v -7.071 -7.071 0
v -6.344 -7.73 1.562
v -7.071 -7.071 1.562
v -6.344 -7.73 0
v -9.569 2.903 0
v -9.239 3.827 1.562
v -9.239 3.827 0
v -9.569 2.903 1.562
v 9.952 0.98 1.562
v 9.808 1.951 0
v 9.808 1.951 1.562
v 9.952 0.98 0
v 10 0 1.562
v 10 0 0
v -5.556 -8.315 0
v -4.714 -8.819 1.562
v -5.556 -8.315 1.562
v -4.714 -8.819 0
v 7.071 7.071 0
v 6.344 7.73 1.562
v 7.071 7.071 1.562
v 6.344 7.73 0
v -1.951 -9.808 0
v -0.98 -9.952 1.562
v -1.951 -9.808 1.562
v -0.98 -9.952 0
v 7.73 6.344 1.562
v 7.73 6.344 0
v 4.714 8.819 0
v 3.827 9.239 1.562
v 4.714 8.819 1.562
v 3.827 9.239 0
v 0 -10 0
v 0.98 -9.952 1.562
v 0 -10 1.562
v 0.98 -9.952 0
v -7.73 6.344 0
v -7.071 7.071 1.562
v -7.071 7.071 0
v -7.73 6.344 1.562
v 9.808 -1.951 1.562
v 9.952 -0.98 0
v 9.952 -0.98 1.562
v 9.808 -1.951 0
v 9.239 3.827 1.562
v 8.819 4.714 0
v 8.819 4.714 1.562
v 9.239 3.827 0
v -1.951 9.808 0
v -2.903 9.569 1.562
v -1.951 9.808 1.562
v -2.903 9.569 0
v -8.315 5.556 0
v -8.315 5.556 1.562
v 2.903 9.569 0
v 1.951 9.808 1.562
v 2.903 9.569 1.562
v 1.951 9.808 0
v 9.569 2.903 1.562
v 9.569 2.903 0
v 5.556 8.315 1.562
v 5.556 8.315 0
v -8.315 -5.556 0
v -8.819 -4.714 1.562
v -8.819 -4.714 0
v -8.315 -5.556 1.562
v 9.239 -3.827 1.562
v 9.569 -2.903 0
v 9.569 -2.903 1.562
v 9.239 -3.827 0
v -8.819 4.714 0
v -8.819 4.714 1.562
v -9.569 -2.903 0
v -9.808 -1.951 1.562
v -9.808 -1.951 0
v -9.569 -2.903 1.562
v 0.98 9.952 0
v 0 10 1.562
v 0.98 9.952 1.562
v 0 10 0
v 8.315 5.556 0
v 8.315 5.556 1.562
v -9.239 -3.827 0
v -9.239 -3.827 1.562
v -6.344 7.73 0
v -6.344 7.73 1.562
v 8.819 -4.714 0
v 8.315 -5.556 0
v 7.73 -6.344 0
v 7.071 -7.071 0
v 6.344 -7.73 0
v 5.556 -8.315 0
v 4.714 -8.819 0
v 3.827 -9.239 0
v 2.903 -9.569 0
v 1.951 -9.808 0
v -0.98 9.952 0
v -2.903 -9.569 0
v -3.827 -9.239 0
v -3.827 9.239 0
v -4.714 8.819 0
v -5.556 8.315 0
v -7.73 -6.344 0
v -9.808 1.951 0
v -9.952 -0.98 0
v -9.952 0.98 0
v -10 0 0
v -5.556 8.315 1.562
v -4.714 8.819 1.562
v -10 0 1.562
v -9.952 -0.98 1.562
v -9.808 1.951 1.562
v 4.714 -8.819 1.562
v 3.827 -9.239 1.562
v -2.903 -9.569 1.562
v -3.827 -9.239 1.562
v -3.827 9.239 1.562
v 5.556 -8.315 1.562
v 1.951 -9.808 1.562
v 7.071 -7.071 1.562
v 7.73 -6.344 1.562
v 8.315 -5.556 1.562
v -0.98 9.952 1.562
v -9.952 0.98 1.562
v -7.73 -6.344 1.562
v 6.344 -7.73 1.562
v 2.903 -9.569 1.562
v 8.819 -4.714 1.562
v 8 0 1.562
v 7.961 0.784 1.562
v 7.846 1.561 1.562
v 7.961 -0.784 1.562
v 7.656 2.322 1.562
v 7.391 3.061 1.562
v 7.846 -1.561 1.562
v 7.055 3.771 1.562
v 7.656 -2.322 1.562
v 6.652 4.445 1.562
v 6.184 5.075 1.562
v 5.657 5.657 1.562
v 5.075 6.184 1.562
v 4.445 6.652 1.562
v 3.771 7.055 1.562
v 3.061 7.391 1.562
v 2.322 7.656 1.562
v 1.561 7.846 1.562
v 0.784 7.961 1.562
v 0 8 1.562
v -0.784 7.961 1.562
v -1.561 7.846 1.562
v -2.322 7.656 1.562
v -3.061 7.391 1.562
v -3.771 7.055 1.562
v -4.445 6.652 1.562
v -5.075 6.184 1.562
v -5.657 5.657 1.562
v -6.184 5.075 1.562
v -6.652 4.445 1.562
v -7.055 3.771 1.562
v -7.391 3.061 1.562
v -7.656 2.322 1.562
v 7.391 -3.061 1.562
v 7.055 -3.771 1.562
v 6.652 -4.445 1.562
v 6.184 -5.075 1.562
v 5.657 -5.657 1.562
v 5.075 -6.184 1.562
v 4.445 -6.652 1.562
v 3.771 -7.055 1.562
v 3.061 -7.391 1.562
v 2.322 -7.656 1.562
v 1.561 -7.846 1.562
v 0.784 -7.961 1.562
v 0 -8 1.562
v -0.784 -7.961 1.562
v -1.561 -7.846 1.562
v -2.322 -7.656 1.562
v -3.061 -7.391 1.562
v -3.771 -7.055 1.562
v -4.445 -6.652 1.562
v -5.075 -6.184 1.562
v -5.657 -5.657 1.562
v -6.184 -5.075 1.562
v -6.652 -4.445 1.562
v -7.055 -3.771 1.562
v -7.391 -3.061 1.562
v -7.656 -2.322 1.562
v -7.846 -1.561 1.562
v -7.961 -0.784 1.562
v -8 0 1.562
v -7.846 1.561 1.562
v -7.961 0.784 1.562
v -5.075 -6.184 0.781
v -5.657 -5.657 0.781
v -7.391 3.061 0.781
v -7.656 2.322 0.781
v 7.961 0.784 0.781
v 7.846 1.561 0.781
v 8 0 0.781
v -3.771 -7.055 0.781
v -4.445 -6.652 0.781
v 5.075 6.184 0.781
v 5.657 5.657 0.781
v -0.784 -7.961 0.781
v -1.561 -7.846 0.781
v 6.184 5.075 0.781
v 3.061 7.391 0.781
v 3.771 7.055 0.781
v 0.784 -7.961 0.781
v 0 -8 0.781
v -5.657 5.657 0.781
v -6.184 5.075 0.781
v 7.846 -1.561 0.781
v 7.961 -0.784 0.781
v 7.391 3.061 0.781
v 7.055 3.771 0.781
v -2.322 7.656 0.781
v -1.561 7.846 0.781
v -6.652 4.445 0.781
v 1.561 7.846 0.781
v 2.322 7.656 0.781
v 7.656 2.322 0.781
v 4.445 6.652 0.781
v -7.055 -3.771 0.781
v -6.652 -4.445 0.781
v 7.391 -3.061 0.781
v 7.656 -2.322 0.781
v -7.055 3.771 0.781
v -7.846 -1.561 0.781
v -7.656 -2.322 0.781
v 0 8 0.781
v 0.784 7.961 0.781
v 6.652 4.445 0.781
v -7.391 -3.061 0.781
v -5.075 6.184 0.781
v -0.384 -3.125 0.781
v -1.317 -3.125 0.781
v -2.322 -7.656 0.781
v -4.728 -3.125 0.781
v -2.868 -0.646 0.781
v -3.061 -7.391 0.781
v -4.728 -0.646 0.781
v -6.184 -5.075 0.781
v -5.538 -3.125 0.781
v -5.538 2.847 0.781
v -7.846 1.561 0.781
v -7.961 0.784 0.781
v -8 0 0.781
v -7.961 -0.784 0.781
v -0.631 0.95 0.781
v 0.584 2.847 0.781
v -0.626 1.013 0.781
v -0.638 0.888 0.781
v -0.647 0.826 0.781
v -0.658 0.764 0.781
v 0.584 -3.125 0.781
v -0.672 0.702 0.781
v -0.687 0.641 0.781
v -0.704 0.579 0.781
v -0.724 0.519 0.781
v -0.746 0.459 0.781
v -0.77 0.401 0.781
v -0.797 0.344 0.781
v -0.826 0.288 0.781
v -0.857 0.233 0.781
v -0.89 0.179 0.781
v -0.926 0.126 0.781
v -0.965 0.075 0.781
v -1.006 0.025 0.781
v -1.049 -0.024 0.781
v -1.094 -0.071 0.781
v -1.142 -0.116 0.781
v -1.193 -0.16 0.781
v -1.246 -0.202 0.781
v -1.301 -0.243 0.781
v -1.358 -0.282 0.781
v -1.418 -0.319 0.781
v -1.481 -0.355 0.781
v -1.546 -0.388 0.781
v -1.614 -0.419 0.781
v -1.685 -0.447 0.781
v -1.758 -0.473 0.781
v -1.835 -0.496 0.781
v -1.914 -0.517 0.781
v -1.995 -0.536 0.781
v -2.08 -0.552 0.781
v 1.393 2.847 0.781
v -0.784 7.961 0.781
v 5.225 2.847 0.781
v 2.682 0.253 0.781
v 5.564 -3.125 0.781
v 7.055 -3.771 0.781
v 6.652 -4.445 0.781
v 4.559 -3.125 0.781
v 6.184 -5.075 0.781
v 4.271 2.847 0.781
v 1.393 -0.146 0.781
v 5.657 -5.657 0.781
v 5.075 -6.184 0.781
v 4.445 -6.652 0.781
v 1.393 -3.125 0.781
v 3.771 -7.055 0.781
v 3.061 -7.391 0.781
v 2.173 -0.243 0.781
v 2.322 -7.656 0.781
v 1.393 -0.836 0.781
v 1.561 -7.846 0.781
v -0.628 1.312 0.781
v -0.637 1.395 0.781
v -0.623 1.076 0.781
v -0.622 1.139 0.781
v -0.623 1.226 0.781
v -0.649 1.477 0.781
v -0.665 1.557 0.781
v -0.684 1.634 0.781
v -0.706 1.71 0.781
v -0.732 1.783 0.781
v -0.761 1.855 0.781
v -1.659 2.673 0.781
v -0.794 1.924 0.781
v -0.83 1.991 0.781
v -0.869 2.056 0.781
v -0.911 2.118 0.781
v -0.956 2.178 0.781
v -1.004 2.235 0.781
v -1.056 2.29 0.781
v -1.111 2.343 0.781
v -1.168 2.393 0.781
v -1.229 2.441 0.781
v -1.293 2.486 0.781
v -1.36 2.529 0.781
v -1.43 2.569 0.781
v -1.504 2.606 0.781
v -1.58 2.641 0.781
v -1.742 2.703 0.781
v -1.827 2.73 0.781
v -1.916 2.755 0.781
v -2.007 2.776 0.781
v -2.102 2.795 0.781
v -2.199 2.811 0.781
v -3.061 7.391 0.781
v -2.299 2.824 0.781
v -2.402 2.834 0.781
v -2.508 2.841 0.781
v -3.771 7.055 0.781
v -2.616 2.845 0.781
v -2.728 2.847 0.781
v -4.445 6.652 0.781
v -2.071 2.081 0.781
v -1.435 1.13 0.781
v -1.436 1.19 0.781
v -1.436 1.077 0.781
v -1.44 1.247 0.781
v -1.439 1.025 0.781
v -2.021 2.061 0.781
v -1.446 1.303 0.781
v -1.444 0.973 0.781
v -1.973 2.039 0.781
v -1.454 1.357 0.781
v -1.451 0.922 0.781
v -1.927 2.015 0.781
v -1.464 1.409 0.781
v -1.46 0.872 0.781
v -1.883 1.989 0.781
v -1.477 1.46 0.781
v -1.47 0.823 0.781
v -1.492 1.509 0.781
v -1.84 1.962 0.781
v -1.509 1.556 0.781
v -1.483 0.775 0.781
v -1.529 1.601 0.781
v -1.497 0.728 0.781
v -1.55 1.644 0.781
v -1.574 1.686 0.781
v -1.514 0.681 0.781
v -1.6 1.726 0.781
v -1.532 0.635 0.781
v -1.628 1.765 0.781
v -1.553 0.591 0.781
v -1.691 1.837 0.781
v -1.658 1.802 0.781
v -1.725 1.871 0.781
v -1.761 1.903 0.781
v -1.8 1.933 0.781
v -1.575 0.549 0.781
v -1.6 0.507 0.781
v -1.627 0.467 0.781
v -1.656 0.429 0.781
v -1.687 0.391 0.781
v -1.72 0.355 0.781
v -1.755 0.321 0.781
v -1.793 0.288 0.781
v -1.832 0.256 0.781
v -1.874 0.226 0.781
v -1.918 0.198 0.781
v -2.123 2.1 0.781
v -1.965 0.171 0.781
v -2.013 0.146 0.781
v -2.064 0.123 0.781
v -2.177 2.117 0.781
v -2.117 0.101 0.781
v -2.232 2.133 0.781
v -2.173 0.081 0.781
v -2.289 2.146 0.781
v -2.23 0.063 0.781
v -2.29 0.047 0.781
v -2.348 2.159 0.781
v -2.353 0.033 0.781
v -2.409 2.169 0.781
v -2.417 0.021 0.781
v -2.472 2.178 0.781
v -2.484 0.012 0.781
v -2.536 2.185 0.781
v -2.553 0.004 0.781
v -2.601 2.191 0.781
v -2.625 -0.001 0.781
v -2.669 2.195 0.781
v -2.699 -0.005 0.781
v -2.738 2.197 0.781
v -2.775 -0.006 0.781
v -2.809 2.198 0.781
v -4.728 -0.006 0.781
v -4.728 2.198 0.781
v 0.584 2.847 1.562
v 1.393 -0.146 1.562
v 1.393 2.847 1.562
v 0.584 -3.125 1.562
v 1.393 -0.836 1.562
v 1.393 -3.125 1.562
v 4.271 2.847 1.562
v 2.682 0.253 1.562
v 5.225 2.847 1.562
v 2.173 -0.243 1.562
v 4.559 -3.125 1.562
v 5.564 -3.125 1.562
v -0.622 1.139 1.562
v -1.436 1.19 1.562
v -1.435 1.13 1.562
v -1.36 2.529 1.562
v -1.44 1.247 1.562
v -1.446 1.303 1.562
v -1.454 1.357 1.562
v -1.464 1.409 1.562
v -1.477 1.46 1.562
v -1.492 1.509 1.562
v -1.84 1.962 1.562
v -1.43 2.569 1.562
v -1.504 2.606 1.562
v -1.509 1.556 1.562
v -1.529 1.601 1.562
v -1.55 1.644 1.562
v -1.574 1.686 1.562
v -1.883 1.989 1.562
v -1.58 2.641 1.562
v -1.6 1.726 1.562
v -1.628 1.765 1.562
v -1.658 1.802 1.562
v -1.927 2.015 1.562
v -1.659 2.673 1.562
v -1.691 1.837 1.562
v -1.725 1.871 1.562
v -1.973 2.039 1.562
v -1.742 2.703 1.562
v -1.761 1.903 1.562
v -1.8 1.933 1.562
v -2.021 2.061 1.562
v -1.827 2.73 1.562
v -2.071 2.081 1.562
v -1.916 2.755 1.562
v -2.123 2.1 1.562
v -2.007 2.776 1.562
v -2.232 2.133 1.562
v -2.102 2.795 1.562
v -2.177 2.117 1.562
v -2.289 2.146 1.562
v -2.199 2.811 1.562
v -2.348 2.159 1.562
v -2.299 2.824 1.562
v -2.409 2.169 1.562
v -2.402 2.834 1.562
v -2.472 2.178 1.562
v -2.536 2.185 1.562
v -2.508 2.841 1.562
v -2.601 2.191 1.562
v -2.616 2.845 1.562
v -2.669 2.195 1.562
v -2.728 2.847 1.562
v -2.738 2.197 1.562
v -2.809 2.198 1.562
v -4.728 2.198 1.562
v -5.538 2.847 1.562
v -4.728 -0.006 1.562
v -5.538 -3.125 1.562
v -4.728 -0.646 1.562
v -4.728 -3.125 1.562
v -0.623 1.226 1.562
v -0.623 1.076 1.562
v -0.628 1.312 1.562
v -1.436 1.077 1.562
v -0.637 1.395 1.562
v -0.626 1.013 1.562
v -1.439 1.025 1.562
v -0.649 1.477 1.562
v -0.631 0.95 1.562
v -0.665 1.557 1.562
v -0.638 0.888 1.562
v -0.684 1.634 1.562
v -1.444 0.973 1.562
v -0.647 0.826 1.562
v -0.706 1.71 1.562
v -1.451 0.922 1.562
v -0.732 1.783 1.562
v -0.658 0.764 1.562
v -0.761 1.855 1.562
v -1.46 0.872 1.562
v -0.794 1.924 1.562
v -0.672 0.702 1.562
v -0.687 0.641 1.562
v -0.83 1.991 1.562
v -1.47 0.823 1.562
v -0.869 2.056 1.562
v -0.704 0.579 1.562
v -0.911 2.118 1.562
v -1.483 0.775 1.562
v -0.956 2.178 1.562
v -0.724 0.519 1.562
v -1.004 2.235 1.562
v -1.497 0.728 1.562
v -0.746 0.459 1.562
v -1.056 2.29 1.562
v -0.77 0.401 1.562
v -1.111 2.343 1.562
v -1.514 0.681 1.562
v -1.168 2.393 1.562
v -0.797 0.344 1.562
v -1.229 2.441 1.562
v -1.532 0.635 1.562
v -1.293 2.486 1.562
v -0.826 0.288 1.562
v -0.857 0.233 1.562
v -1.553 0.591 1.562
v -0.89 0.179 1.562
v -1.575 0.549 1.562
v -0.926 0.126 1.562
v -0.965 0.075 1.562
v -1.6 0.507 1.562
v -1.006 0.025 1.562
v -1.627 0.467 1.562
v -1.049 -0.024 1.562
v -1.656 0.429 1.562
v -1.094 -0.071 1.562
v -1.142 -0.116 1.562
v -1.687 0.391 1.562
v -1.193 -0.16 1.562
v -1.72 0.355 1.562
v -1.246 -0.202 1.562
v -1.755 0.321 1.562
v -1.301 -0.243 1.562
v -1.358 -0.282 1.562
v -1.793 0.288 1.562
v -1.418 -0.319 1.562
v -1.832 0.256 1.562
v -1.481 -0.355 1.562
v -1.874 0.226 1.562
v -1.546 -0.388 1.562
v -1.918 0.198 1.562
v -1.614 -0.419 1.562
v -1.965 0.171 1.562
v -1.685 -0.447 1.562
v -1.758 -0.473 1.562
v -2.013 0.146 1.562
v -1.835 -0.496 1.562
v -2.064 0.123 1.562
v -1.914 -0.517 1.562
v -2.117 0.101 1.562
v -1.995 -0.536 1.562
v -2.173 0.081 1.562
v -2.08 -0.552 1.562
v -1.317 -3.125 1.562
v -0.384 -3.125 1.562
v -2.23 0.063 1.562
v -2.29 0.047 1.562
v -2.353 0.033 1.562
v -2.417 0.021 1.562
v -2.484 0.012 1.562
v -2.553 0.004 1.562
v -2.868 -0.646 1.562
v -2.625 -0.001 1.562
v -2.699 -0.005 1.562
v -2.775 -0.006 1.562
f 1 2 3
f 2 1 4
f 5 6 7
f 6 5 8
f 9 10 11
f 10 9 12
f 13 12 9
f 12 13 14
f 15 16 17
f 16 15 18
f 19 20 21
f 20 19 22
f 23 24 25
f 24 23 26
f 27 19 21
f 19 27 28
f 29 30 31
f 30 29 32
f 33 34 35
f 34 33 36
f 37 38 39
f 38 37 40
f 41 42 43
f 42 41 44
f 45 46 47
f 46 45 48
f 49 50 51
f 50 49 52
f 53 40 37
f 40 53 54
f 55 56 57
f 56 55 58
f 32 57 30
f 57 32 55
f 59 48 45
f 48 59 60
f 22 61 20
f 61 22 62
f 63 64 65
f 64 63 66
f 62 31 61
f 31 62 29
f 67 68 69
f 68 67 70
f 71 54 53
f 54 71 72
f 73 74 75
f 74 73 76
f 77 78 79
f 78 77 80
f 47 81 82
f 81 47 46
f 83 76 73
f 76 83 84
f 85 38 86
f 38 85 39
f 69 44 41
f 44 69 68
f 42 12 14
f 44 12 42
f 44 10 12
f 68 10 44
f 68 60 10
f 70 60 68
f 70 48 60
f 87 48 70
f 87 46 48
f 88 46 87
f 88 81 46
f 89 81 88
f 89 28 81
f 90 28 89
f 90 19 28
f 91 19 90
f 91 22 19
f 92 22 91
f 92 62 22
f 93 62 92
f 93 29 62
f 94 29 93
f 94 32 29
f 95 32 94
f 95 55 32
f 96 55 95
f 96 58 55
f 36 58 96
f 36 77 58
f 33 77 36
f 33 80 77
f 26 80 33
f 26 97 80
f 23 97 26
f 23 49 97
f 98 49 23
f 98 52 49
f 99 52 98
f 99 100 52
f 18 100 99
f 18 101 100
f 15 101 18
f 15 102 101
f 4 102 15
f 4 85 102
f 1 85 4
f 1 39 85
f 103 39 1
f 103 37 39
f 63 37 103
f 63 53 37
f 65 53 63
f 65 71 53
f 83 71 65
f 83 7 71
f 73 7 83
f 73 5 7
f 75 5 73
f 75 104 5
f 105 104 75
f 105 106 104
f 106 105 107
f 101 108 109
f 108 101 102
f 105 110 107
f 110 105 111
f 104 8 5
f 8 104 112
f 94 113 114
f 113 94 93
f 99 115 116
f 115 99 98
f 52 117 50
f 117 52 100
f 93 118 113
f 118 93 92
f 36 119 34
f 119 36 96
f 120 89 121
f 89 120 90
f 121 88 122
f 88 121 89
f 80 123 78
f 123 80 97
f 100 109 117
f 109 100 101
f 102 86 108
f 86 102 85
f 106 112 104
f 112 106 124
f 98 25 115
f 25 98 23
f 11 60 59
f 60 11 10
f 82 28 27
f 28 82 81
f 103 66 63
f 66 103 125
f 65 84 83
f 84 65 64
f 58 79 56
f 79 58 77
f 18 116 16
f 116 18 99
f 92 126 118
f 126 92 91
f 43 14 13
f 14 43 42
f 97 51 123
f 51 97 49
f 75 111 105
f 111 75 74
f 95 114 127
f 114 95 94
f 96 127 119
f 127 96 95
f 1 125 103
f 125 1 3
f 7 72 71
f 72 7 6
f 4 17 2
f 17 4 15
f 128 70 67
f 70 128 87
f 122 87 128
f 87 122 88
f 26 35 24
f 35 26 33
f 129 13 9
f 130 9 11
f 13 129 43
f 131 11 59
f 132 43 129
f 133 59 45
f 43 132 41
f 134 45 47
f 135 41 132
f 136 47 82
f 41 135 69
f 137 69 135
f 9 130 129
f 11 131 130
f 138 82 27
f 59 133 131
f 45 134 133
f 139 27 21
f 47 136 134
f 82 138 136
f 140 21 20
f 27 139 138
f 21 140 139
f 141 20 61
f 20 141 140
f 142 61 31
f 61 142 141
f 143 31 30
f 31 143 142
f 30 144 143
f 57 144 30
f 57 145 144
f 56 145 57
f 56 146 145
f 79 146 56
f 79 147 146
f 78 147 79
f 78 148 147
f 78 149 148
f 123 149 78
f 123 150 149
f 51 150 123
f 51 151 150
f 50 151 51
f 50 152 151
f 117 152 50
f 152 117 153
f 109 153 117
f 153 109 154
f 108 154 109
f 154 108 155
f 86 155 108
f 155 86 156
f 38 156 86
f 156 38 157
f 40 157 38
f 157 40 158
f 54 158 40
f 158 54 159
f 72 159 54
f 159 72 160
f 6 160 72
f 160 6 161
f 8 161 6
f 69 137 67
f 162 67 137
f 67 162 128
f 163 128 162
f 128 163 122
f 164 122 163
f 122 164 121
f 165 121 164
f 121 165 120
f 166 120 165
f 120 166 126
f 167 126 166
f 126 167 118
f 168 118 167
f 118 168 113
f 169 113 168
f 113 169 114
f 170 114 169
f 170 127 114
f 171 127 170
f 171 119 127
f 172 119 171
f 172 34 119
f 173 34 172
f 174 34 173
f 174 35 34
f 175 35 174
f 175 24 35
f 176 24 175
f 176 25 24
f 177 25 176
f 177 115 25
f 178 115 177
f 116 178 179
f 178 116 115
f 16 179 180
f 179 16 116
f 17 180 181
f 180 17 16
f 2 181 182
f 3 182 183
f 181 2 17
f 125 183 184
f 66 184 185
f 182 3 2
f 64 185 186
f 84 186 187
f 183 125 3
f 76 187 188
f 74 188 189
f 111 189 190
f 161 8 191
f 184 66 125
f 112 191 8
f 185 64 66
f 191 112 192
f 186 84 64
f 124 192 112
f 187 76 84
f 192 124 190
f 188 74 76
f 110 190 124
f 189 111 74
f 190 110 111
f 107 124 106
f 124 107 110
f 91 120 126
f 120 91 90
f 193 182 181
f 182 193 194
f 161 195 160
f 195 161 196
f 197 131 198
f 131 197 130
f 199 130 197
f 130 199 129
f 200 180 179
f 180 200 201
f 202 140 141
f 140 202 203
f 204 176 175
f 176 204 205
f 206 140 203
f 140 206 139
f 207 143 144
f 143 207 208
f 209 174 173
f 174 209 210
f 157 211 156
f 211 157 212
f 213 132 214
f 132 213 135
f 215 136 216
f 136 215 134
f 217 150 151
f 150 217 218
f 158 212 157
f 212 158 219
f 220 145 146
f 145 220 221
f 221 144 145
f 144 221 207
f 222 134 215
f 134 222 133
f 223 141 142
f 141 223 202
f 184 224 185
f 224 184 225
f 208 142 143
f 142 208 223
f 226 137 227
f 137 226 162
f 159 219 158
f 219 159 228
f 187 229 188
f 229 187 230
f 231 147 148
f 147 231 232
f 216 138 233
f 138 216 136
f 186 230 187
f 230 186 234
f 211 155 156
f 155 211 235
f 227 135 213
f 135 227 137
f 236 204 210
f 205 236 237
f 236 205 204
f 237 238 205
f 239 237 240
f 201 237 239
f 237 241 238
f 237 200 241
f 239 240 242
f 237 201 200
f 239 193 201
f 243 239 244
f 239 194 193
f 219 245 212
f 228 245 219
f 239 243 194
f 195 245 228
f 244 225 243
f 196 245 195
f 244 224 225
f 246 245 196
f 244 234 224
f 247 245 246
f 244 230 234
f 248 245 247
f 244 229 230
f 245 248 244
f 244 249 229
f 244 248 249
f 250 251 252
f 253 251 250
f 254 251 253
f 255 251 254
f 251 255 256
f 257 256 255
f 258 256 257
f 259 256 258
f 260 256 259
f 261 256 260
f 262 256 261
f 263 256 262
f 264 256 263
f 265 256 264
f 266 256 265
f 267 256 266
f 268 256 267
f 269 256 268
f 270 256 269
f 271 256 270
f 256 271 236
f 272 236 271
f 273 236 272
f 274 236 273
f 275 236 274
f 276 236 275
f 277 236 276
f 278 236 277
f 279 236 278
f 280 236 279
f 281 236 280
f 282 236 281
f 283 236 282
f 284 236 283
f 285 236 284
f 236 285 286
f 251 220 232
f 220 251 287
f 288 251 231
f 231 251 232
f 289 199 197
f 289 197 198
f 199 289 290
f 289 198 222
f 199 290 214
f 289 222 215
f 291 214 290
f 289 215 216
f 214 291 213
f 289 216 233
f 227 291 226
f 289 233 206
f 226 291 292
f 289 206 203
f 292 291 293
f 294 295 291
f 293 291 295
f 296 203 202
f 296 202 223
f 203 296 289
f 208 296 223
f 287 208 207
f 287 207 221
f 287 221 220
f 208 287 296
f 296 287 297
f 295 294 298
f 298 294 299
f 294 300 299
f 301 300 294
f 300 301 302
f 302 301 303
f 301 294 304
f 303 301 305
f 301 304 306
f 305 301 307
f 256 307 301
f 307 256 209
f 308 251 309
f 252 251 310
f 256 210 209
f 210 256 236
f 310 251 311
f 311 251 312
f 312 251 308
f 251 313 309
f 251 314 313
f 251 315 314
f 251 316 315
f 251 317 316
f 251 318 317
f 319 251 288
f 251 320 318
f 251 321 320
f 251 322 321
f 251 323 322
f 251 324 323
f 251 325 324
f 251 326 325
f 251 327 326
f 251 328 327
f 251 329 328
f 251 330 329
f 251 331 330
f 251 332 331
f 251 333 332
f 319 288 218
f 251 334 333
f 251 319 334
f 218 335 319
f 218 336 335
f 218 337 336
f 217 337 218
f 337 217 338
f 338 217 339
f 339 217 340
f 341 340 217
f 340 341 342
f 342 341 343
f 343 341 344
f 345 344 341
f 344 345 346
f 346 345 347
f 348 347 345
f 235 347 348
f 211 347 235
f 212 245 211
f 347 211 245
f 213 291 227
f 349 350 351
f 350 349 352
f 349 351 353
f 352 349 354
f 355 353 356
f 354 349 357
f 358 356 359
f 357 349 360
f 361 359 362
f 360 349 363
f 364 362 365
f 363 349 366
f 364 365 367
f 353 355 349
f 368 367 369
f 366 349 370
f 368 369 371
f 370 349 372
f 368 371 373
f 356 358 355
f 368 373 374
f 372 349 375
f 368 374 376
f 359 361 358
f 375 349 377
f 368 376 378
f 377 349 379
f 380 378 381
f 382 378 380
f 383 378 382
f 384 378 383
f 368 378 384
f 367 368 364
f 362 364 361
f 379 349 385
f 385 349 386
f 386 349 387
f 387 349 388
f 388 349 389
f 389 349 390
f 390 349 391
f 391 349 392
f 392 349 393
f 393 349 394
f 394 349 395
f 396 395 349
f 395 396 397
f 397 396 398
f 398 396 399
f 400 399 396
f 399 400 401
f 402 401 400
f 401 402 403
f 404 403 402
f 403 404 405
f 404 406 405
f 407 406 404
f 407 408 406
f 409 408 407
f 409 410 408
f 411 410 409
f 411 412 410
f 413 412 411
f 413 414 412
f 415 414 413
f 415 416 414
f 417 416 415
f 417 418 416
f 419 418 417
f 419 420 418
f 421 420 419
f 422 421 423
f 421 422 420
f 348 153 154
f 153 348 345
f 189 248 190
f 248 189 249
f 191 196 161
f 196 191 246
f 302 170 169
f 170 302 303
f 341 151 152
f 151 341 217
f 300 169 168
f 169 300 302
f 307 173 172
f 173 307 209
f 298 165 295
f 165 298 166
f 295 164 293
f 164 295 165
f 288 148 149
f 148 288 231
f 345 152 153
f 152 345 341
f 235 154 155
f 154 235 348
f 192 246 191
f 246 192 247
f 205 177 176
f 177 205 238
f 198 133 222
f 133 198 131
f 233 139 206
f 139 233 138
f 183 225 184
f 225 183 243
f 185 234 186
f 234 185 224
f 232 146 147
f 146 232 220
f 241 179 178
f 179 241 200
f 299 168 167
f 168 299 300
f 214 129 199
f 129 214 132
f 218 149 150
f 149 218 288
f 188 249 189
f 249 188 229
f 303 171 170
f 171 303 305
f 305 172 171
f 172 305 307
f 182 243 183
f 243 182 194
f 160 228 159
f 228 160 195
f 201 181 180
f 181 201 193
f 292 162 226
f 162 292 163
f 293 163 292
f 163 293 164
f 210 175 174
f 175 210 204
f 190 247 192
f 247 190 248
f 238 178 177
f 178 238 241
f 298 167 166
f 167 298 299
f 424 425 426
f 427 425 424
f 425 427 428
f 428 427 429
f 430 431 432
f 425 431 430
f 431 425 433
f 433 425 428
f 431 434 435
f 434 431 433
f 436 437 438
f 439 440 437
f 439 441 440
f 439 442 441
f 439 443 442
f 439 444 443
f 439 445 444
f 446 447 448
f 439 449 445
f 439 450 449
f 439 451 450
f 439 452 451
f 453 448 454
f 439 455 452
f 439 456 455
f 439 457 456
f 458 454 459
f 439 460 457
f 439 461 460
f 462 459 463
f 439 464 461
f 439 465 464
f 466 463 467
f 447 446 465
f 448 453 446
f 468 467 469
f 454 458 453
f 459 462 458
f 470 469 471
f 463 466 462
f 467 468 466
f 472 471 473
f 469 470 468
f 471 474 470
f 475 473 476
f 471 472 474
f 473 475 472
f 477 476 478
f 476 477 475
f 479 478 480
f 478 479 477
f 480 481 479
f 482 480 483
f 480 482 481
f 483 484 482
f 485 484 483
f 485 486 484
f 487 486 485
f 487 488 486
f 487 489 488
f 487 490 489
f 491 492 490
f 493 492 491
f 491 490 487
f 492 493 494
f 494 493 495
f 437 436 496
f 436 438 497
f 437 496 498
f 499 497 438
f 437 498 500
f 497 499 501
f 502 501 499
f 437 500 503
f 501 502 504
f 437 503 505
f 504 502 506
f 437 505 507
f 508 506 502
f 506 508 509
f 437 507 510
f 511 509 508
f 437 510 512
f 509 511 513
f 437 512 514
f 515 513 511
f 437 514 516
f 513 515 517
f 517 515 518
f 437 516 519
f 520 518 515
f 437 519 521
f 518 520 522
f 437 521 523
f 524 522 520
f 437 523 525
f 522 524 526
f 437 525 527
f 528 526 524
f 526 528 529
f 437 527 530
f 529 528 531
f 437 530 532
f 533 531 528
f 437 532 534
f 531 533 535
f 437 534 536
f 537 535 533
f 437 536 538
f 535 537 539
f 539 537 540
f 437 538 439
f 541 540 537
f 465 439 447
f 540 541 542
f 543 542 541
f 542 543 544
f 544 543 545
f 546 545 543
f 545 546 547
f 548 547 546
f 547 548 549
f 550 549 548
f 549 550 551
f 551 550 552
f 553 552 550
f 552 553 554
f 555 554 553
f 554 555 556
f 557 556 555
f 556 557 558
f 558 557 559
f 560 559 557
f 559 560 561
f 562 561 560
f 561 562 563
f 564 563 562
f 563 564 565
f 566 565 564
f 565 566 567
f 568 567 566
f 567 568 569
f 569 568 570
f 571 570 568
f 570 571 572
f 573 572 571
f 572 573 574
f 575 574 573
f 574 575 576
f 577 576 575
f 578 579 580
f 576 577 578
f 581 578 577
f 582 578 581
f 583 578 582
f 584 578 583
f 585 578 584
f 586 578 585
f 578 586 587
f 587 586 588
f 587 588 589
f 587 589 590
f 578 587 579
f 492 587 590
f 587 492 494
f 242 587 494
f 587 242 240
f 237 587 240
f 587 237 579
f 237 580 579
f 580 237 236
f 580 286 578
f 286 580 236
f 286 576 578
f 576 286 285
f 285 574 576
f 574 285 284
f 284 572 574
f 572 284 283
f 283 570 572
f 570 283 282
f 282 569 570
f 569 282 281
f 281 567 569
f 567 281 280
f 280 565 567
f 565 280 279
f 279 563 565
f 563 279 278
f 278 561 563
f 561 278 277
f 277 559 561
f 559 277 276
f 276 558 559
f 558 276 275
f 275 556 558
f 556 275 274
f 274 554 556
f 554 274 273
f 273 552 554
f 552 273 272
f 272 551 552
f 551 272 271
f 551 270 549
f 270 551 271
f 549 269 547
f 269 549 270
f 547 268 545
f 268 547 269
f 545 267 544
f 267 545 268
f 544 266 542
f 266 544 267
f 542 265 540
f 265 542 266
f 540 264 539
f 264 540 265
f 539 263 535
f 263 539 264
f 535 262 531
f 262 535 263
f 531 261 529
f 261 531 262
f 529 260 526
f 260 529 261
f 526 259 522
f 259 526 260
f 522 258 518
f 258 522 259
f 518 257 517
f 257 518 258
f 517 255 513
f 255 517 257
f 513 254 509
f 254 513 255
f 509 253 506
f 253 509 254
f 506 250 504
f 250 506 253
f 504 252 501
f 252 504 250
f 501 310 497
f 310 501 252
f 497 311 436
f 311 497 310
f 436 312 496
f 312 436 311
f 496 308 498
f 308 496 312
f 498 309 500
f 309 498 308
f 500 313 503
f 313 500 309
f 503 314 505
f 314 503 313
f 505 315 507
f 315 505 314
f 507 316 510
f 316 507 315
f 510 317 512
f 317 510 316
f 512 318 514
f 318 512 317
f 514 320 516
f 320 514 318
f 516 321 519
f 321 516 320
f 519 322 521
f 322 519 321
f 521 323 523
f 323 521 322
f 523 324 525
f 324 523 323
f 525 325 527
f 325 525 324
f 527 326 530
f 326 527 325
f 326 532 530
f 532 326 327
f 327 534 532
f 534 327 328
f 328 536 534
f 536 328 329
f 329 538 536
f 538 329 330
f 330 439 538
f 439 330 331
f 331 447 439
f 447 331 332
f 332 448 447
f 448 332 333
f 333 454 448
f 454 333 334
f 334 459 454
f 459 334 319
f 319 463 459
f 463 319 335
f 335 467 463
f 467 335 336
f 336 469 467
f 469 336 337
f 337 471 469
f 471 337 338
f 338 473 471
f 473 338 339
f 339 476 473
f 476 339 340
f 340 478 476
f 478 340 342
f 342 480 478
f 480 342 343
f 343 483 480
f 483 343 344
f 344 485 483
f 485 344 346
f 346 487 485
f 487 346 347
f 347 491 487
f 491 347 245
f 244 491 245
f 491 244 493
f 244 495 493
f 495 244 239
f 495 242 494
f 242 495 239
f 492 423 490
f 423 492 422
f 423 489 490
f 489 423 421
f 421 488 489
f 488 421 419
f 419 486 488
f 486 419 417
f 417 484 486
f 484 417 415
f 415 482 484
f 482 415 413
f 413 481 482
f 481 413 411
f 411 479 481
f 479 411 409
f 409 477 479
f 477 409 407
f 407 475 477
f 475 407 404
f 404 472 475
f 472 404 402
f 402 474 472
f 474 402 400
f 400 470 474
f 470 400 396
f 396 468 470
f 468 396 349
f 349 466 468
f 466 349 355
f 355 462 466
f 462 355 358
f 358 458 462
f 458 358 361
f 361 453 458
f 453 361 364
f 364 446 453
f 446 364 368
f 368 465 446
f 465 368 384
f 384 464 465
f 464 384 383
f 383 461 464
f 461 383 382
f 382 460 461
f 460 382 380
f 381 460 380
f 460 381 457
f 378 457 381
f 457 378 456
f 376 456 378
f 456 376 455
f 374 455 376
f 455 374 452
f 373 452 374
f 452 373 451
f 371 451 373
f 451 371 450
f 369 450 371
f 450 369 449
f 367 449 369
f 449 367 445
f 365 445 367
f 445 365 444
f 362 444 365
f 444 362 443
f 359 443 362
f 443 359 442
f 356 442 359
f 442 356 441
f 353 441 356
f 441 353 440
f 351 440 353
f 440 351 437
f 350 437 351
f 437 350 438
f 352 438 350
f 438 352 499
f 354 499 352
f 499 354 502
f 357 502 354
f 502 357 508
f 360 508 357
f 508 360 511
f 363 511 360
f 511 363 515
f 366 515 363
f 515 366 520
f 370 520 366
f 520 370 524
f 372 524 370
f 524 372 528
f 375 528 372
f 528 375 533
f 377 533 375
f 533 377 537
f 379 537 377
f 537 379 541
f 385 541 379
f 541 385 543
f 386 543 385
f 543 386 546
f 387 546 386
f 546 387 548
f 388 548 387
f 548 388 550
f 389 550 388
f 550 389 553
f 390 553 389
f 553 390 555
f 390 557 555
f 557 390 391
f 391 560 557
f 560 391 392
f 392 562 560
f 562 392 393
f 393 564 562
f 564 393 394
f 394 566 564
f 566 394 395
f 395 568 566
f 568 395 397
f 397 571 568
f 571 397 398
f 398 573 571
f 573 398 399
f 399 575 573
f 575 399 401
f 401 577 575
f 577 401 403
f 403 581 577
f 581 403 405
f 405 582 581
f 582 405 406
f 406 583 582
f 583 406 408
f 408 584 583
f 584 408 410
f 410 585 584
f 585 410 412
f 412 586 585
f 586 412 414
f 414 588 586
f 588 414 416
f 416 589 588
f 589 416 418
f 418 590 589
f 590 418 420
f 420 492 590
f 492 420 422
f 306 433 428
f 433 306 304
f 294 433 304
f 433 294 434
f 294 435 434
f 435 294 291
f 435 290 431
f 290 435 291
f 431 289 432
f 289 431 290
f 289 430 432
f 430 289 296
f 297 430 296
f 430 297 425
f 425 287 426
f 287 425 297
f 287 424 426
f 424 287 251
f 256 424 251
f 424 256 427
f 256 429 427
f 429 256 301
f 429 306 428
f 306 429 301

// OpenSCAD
$fn = 64;

size_index = 100;
button_radius = size_index/10;
rim_size = size_index/100;
internal_radius = button_radius - rim_size*2;
//button_height = 1.8;
button_height = size_index/64;
button_drop = button_height/2;
font_size = size_index/16;

text = "Align";
 font = "Liberation Sans";
 
 valign = [
   [  0, "top"],
   [ 40, "center"],
   [ 75, "baseline"],
   [110, "bottom"]
 ];
 
difference() {
    cylinder(r = button_radius, h = button_height);
    translate([0, 0, button_drop]) {
        cylinder(r = internal_radius, h = button_drop);
    }
    
}


content = "RK";
font = "Liberation Sans";

translate ([-(font_size),-(font_size/2),0]) {
   linear_extrude(height = button_height) {
       text("RK", font = font, size = font_size);
     }
 }
 /*
projection() {
    translate([0,0,button_drop*sqrt(2)]) {
        text("asdf", halign=50);
    }
}
*/
